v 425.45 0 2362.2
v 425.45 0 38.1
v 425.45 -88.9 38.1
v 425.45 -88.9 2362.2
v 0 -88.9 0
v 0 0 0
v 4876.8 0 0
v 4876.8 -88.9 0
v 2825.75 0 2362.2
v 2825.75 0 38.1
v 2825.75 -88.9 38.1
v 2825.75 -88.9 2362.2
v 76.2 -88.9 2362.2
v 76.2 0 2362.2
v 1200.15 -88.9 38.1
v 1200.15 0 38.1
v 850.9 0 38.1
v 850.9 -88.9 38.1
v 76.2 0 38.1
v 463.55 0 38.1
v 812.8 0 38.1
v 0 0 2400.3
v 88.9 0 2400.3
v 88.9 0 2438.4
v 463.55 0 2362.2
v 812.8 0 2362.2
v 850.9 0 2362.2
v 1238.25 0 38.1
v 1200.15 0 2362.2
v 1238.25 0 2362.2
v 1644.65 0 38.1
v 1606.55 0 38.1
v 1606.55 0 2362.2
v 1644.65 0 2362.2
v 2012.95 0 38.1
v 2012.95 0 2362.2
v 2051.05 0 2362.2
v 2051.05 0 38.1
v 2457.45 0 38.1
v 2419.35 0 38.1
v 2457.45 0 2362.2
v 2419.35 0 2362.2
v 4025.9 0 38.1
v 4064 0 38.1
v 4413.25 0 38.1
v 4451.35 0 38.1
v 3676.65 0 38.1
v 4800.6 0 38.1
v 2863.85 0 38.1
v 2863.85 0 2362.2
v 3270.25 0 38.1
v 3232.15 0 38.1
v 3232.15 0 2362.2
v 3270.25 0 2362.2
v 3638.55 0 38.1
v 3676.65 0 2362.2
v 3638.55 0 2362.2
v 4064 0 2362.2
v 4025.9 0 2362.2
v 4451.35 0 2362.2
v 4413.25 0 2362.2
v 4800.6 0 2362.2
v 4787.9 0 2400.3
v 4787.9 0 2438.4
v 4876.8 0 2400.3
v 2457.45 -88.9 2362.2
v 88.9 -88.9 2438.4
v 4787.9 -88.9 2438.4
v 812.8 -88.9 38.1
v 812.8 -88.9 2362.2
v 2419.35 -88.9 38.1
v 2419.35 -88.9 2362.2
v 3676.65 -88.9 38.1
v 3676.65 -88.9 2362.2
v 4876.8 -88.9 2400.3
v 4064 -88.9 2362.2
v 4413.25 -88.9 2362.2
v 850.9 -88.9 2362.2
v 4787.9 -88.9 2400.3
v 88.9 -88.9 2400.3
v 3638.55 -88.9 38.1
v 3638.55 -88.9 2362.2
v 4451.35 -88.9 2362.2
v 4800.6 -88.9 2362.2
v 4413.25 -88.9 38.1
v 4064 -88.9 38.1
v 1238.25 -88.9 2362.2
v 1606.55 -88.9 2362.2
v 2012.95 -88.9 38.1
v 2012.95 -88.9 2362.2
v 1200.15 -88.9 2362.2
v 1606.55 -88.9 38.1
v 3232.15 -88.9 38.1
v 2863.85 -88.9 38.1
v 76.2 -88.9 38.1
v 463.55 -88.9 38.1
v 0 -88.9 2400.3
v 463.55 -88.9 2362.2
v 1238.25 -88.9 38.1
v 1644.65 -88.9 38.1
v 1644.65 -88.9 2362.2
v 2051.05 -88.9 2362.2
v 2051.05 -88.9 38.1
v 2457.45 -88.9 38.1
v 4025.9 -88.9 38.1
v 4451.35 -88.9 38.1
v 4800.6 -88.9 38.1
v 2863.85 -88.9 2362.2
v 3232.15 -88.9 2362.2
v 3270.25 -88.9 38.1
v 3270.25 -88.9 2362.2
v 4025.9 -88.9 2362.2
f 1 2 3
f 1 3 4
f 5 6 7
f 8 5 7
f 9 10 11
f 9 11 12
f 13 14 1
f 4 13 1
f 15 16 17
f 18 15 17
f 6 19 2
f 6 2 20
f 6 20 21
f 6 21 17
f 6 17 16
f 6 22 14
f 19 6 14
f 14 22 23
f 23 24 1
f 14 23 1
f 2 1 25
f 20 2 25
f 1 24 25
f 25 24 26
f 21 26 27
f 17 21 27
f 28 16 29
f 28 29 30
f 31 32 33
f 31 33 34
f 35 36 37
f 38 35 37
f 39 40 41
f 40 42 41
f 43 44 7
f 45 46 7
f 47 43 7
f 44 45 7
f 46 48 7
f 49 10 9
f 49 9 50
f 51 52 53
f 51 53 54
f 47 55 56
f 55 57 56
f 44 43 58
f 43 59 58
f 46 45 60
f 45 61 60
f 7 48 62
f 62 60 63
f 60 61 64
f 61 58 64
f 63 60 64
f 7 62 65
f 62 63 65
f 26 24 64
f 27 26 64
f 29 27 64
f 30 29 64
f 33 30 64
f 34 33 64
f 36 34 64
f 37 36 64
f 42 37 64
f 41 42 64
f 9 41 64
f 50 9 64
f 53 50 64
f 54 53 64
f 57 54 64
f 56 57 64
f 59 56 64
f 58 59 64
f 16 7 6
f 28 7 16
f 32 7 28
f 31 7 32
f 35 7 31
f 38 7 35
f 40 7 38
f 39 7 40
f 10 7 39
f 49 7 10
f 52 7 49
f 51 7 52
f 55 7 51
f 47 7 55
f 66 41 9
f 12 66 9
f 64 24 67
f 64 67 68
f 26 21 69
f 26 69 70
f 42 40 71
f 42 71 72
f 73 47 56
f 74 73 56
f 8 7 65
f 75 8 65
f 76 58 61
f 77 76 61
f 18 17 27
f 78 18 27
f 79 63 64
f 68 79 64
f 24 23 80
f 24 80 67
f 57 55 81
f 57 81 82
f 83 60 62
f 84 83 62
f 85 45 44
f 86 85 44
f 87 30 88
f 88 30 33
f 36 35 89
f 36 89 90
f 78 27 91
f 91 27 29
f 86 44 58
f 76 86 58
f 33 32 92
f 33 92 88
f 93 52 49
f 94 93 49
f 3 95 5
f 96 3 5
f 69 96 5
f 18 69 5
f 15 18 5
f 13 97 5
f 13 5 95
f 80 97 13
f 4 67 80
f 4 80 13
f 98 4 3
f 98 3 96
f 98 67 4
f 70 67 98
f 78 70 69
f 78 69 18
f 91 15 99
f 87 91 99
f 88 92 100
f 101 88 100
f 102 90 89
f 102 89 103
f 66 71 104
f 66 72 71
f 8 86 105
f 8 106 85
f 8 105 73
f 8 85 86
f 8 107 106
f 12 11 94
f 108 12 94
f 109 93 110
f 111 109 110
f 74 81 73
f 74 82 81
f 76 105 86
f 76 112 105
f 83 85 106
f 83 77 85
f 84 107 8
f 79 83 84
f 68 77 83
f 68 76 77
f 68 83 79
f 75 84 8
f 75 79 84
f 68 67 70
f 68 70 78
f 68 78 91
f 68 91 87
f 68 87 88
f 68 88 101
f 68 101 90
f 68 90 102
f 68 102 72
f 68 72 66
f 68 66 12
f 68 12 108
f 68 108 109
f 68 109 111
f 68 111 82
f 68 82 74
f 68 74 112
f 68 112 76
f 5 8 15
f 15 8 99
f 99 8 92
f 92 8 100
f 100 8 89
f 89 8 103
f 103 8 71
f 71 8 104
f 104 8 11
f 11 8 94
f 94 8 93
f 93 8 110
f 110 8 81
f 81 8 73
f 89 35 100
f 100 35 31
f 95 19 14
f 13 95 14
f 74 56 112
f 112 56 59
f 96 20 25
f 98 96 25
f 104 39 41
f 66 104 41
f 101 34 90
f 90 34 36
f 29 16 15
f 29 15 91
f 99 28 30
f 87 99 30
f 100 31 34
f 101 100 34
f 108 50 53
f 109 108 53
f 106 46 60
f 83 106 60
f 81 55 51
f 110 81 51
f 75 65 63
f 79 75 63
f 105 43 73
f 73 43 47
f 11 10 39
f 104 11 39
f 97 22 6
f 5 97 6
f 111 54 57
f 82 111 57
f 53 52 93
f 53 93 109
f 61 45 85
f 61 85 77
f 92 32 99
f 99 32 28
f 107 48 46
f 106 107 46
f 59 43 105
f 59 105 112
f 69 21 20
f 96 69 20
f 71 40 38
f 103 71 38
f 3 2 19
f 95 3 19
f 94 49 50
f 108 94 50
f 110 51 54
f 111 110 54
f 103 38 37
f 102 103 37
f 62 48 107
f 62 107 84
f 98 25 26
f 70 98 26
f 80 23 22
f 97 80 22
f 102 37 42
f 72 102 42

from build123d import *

# Parameters (mm, degrees)
F0_W     = 38.1
F0_H     = 2324.1
F0_W_2   = 4699
F0_H_2   = 38.1
F1_DEPTH = 88.9


# Not quite as in the source:
# - a feature names something its author has since deleted; it is built from what else it names


with BuildPart() as f1:
    # F0 (on Front) → F1 (new body)
    with BuildSketch(Plane.XZ):
        with Locations((19.05, 1200.15)):
            Rectangle(F0_W, F0_H)
        with Locations((57.15, 1200.15)):
            Rectangle(F0_W, F0_H)
        with Locations((444.5, 1200.15)):
            Rectangle(F0_W, F0_H)
        with Locations((831.85, 1200.15)):
            Rectangle(F0_W, F0_H)
        with Locations((1219.2, 1200.15)):
            Rectangle(F0_W, F0_H)
        with Locations((2032, 1200.15)):
            Rectangle(F0_W, F0_H)
        with Locations((4819.65, 1200.15)):
            Rectangle(F0_W, F0_H)
        with Locations((4857.75, 1200.15)):
            Rectangle(F0_W, F0_H)
        Polygon((0, 2400.3), (0, 2362.2), (38.1, 2362.2), (76.2, 2362.2), (425.45, 2362.2), (463.55, 2362.2), (812.8, 2362.2), (850.9, 2362.2), (1200.15, 2362.2), (1238.25, 2362.2), (1606.55, 2362.2), (1644.65, 2362.2), (2012.95, 2362.2), (2051.05, 2362.2), (2419.35, 2362.2), (2457.45, 2362.2), (2825.75, 2362.2), (2863.85, 2362.2), (3232.15, 2362.2), (3270.25, 2362.2), (3638.55, 2362.2), (3676.65, 2362.2), (4025.9, 2362.2), (4064, 2362.2), (4413.25, 2362.2), (4451.35, 2362.2), (4800.6, 2362.2), (4838.7, 2362.2), (4876.8, 2362.2), (4876.8, 2400.3), (4787.9, 2400.3), (88.9, 2400.3), align=None)
        with Locations((2438.4, 2419.35)):
            Rectangle(F0_W_2, F0_H_2)
        Polygon((0, 38.1), (0, 0), (4876.8, 0), (4876.8, 38.1), (4838.7, 38.1), (4800.6, 38.1), (4451.35, 38.1), (4413.25, 38.1), (4064, 38.1), (4025.9, 38.1), (3676.65, 38.1), (3638.55, 38.1), (3270.25, 38.1), (3232.15, 38.1), (2863.85, 38.1), (2825.75, 38.1), (2457.45, 38.1), (2419.35, 38.1), (2051.05, 38.1), (2012.95, 38.1), (1644.65, 38.1), (1606.55, 38.1), (1238.25, 38.1), (1200.15, 38.1), (850.9, 38.1), (812.8, 38.1), (463.55, 38.1), (425.45, 38.1), (76.2, 38.1), (38.1, 38.1), align=None)
        with Locations((1625.6, 1200.15)):
            Rectangle(F0_W, F0_H)
        with Locations((2438.4, 1200.15)):
            Rectangle(F0_W, F0_H)
        with Locations((2844.8, 1200.15)):
            Rectangle(F0_W, F0_H)
        with Locations((3251.2, 1200.15)):
            Rectangle(F0_W, F0_H)
        with Locations((3657.6, 1200.15)):
            Rectangle(F0_W, F0_H)
        with Locations((4044.95, 1200.15)):
            Rectangle(F0_W, F0_H)
        with Locations((4432.3, 1200.15)):
            Rectangle(F0_W, F0_H)
    extrude(amount=F1_DEPTH)


solid = f1.part
